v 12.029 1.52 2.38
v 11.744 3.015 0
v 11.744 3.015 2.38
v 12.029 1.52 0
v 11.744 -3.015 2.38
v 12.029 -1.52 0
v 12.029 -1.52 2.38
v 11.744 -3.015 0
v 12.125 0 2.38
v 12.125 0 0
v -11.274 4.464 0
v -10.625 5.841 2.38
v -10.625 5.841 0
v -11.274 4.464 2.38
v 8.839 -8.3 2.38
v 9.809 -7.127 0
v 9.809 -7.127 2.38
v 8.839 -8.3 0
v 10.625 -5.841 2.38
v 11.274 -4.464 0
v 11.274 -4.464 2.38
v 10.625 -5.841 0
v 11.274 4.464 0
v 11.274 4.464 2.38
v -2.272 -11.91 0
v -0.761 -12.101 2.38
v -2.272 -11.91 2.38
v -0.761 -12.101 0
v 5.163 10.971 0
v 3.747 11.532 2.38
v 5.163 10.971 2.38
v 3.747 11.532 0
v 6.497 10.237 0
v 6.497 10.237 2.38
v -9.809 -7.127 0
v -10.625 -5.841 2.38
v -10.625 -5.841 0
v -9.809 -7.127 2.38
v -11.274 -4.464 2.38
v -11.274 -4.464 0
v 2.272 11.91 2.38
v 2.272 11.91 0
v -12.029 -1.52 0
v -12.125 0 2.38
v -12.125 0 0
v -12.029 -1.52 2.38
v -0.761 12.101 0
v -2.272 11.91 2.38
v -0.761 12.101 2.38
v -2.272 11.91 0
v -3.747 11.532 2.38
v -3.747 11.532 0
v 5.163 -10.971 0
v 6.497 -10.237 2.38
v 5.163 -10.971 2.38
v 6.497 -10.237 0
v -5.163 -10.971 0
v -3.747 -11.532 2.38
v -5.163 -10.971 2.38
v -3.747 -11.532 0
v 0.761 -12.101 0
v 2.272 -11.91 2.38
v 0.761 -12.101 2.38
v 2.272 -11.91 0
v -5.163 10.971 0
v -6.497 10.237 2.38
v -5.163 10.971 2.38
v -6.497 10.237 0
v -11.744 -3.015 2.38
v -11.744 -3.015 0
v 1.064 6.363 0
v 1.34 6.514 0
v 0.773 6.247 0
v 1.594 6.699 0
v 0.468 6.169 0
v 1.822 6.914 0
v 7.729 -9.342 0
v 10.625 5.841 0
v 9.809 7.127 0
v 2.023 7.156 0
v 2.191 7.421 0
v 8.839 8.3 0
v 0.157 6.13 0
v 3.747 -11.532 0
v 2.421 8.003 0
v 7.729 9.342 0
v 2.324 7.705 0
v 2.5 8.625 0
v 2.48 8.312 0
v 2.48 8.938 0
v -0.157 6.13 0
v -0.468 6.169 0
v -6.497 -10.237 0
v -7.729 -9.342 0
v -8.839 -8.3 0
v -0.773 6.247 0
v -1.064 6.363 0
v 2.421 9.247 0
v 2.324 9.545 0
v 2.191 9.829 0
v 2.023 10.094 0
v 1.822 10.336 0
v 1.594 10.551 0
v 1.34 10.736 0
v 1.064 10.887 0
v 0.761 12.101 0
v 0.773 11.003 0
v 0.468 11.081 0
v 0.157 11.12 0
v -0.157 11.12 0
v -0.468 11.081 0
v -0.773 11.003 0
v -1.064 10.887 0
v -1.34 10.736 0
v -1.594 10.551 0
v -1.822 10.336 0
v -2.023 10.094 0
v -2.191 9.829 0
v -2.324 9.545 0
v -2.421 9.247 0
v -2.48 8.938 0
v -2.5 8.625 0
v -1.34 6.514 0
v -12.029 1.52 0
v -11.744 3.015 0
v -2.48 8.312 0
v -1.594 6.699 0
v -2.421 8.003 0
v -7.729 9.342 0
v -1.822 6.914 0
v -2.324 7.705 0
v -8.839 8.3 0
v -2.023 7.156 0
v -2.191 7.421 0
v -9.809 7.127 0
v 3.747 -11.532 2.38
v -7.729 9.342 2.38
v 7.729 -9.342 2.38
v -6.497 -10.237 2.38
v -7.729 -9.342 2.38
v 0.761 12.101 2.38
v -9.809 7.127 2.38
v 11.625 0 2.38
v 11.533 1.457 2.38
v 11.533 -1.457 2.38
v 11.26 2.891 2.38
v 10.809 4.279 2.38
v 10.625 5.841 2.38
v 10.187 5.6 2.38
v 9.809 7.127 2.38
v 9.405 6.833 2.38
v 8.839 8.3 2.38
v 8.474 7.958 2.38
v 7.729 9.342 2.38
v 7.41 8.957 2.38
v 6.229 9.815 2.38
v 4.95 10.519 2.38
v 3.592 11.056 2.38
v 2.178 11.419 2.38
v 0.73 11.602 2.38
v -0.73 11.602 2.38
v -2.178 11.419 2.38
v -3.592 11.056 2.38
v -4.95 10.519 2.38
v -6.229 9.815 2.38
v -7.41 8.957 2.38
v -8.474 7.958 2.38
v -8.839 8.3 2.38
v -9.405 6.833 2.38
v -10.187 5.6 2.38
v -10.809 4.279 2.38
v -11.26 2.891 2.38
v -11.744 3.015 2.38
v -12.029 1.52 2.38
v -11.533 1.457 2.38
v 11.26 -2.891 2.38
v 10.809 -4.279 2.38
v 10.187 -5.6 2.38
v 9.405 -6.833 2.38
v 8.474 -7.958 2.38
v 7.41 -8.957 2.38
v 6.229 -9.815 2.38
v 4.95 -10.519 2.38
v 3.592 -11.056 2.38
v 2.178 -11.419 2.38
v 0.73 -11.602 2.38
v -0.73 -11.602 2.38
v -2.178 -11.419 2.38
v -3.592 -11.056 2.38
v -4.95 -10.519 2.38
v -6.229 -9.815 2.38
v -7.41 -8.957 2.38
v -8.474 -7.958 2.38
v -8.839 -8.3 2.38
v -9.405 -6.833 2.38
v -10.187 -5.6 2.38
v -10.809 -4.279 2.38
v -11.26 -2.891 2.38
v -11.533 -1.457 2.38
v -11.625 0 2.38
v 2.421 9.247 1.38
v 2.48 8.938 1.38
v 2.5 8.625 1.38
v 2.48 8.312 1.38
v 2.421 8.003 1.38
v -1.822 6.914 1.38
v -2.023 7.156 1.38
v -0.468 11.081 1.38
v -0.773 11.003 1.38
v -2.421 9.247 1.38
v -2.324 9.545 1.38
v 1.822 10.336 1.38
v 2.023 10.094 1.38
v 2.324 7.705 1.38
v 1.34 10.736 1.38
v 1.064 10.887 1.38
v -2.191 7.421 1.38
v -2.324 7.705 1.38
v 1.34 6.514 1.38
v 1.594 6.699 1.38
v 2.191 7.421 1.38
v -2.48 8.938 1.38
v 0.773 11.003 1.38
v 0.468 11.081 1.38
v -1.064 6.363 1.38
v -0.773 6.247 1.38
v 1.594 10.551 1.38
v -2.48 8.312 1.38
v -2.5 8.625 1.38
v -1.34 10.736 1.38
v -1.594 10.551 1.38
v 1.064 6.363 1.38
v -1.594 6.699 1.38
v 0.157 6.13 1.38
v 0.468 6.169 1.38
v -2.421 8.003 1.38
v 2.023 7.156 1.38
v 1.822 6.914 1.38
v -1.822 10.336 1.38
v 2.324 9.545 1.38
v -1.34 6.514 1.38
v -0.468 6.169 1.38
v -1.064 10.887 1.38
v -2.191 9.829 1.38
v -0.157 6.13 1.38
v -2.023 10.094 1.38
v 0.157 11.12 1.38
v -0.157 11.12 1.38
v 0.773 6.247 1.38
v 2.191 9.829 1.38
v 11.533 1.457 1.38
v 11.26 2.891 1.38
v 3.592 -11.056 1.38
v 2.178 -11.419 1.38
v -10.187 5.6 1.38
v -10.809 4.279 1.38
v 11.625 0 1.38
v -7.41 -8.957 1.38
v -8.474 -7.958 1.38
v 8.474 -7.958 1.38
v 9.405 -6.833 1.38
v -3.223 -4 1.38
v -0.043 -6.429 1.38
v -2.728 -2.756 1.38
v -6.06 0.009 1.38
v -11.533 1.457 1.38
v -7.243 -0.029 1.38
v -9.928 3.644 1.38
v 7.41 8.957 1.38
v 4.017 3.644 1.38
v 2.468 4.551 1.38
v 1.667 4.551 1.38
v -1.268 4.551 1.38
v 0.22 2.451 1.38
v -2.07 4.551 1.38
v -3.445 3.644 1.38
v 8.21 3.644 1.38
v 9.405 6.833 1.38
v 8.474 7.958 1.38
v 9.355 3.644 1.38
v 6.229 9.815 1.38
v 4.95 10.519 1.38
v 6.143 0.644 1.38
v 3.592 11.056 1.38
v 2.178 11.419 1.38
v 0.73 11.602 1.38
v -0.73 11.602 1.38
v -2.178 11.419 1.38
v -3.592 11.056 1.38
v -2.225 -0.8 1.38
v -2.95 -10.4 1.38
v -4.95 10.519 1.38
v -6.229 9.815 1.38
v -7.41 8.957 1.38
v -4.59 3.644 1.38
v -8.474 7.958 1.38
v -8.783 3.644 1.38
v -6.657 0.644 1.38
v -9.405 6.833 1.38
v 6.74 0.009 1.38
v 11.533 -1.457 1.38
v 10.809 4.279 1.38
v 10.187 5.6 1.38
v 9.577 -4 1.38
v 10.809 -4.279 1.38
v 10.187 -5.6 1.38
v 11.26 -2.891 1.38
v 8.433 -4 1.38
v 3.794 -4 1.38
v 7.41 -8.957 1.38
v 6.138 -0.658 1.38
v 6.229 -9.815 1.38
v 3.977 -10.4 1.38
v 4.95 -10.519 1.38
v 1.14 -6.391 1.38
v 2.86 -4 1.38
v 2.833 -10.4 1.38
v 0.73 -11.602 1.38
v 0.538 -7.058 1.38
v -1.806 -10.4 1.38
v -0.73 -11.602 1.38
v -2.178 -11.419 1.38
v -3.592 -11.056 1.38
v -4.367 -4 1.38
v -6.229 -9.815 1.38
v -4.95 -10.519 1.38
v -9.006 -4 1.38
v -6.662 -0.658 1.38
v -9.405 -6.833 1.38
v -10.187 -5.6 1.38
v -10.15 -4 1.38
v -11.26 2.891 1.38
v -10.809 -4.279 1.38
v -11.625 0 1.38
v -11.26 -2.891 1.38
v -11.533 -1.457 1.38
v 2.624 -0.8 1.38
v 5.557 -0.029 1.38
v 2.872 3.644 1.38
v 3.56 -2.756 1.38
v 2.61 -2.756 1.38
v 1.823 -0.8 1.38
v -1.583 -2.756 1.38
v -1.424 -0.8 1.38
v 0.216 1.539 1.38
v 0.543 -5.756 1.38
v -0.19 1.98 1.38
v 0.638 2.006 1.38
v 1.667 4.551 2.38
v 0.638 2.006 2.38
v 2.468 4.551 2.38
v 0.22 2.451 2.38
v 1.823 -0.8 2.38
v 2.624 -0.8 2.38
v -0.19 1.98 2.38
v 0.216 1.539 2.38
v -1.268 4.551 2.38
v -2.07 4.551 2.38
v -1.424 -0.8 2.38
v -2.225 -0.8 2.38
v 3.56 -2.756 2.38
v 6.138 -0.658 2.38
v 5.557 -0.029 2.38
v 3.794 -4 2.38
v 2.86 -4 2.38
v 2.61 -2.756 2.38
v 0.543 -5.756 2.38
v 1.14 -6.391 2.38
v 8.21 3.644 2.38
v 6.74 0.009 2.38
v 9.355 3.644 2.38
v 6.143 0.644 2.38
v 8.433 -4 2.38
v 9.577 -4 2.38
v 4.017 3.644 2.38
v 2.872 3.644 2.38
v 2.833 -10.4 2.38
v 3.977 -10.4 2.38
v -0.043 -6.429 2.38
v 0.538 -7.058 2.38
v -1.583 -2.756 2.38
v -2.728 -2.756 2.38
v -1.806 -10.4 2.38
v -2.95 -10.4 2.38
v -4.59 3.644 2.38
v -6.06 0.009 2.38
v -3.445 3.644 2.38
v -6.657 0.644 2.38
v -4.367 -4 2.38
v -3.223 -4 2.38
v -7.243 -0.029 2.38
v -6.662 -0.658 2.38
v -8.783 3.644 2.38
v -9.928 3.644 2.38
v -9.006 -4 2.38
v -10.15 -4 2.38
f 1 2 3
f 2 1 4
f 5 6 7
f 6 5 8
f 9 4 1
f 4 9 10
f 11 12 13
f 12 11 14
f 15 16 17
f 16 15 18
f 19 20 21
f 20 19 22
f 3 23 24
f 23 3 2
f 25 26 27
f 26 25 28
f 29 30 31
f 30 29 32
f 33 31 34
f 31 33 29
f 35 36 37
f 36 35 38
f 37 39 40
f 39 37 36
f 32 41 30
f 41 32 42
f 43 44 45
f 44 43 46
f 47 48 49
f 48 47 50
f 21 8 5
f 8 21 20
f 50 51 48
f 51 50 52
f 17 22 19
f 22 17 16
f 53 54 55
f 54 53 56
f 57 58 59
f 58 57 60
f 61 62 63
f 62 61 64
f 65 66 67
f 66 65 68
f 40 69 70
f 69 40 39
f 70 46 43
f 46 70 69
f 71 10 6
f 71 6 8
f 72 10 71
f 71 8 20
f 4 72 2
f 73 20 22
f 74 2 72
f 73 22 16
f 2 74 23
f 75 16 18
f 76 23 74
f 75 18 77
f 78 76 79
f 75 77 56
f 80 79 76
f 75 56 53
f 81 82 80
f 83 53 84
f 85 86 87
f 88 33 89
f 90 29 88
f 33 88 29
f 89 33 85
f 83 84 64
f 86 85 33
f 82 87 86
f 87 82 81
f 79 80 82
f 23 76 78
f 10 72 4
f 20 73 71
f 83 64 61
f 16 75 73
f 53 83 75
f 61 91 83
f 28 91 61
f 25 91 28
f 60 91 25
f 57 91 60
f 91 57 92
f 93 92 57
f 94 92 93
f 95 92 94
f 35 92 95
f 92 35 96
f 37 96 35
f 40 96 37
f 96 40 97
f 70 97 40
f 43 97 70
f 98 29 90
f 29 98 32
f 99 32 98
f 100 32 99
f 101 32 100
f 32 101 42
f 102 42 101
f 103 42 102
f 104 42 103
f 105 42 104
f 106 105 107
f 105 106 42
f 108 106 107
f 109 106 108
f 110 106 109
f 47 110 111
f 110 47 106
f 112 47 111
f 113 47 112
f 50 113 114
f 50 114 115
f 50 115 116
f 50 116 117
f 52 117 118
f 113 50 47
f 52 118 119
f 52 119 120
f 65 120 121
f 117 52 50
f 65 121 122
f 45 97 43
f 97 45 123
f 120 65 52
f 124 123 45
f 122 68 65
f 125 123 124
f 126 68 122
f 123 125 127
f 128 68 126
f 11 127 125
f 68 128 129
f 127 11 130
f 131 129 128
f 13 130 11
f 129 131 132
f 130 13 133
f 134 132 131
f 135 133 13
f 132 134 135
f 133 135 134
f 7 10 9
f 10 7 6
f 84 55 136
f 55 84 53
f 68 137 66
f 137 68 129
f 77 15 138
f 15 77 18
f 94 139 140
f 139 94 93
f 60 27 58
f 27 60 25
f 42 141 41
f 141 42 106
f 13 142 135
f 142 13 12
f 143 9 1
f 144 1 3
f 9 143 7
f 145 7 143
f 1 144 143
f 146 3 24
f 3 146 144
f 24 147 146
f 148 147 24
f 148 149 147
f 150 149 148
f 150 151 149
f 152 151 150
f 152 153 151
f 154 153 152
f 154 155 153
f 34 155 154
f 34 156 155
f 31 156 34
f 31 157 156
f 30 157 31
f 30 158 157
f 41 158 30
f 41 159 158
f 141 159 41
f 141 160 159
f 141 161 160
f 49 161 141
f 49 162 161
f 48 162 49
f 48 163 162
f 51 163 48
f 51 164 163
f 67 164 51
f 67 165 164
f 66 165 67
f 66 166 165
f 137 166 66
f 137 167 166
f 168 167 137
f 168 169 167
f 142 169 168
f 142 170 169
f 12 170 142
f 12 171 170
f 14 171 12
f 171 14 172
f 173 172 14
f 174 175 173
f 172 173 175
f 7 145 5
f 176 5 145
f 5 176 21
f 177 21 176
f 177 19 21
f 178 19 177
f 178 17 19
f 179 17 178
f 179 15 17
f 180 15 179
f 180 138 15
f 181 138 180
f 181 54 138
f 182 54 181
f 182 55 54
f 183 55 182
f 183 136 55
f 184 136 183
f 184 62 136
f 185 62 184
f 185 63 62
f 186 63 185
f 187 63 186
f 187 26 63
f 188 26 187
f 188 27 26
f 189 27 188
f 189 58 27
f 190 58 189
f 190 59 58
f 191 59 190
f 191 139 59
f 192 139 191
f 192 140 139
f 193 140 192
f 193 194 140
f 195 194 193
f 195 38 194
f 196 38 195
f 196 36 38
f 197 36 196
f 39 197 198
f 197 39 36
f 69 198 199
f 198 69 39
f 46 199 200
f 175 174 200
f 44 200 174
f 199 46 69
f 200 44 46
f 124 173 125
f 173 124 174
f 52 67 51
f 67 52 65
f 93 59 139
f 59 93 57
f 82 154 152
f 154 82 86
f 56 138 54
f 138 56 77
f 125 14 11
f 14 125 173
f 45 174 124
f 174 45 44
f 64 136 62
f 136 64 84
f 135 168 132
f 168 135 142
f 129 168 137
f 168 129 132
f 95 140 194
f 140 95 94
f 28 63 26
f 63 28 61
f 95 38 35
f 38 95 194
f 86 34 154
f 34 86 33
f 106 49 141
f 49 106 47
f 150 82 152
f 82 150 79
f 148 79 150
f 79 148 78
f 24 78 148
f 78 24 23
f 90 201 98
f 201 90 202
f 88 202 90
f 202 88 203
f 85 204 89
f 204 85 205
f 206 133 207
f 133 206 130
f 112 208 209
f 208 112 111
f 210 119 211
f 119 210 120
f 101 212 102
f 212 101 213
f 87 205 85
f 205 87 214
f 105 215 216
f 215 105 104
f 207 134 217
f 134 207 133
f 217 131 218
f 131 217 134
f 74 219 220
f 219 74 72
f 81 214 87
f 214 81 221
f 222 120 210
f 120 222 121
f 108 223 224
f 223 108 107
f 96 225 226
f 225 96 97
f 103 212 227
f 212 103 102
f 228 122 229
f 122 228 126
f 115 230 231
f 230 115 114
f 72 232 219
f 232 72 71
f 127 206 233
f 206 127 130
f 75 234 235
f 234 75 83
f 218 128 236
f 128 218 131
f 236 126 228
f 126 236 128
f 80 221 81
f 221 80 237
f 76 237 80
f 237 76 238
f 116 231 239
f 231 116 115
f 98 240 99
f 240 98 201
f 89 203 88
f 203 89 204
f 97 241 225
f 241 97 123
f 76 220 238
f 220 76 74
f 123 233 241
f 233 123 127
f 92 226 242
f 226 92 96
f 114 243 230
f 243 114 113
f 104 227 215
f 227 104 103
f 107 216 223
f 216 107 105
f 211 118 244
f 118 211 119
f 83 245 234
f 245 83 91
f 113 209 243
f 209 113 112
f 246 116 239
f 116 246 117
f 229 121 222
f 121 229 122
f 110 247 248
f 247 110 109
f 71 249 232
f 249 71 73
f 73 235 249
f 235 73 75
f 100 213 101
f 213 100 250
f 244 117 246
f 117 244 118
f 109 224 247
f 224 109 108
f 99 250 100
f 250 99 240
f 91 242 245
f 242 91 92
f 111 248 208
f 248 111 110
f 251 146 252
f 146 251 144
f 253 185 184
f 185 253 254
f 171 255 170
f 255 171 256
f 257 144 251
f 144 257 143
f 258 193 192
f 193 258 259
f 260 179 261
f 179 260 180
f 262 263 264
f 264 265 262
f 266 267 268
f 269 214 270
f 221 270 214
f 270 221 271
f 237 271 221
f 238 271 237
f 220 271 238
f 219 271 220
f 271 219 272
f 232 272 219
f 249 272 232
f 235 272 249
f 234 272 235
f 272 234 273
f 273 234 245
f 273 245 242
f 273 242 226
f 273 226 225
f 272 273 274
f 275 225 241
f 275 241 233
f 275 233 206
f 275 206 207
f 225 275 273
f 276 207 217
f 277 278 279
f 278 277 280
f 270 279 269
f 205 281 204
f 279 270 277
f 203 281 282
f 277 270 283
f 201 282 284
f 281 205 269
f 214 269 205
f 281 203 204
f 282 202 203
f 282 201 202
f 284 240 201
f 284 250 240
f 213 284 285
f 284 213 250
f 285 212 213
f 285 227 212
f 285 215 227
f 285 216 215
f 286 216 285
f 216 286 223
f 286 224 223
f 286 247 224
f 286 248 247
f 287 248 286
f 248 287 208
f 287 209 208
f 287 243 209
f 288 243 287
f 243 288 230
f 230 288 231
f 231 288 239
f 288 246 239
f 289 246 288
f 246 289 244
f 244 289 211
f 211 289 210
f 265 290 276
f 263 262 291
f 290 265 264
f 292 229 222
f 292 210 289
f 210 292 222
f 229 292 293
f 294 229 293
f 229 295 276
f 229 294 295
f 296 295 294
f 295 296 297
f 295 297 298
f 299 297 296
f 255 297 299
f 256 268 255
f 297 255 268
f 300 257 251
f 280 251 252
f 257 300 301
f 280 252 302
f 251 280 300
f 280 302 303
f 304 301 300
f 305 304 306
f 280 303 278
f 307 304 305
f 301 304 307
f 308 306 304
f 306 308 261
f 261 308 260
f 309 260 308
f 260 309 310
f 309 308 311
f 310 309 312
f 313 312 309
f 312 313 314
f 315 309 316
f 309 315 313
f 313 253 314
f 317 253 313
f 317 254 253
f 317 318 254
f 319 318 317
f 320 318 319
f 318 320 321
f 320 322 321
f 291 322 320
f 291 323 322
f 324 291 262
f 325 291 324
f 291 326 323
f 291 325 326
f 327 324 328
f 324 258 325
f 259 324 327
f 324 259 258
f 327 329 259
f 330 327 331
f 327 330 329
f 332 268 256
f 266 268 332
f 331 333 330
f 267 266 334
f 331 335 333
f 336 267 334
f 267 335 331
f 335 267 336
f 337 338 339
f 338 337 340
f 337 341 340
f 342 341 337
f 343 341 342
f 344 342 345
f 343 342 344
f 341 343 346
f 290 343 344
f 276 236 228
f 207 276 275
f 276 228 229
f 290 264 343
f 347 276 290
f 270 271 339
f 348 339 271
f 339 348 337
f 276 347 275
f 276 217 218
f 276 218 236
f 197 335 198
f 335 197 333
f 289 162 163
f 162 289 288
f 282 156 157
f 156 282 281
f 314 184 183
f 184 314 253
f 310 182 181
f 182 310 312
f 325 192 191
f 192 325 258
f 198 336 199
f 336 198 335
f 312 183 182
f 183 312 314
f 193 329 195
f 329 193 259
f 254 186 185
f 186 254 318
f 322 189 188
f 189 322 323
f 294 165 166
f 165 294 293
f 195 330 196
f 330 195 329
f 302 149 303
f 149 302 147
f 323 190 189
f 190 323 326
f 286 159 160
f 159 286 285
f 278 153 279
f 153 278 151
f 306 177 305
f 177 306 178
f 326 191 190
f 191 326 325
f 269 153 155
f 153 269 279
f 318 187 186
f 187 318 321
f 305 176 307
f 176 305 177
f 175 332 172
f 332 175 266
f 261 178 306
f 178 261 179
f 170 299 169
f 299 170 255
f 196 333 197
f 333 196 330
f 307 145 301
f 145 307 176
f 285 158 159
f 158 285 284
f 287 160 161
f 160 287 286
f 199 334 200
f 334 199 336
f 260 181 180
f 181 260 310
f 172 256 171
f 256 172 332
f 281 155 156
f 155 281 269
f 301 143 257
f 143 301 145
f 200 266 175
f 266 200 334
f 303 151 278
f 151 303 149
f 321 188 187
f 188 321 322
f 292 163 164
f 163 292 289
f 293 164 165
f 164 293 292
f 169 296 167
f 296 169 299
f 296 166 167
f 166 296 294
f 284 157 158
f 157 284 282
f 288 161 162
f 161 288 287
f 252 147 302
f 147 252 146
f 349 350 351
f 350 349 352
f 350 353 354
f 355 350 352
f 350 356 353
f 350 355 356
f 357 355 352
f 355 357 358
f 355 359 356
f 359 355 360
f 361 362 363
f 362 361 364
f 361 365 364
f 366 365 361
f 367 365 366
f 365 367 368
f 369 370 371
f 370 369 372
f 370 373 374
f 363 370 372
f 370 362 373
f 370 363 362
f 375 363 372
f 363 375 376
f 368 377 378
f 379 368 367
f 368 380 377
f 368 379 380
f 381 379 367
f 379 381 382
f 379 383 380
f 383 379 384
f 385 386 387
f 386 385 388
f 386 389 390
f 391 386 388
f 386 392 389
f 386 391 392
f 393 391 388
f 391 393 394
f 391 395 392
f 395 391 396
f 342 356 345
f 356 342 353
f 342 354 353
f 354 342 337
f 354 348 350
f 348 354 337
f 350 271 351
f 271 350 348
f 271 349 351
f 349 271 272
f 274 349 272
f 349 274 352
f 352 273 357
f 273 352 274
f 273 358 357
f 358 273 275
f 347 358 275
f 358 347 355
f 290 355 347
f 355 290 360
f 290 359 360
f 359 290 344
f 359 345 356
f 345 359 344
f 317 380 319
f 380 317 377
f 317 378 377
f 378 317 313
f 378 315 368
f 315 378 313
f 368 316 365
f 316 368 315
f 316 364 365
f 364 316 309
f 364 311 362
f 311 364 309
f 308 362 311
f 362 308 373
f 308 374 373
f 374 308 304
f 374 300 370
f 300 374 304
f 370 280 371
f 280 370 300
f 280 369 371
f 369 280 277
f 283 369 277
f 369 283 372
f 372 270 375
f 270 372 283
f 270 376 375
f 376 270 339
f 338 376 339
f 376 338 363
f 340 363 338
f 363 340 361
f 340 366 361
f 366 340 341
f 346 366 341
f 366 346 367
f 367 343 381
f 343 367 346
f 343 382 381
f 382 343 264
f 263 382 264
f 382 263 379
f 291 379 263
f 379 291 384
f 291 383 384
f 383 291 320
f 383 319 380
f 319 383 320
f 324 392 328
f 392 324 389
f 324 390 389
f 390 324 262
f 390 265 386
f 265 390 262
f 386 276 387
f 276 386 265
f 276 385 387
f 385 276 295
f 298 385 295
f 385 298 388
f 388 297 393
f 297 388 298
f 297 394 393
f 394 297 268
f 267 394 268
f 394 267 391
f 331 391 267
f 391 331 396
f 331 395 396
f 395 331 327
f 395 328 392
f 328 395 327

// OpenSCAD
// https://economy-finance.ec.europa.eu/euro/euro-coins-and-notes/euro-coins/common-sides-euro-coins_en

// Letter left
LL = "X";
// ...right
LR = "X";
// ... middle (low)
LM = "X";
// ... top (small)
LT = "X";

COIN_D = 24.25;
COIN_H = 2.38;
// key ring hole
HOLE_D = 5;
// key ring hole wall
TOP_S = 1;

// circle resolution
FN = 50;

module unused_test() {
    translate([0,4,0])
        linear_extrude(5)
            text(LR);
    translate([2,-5,0])
        linear_extrude(5)
            text(LL);
    translate([5,0,0])
        linear_extrude(7)
            text(LM);
    translate([-5,0,0])
        linear_extrude(7)
            text(LT);
}

module coin() {
   difference() {
    linear_extrude(COIN_H)
        circle(d=COIN_D, $fn=FN);
    translate([0,COIN_D/2-HOLE_D/2-TOP_S,-1])
        linear_extrude(5)
            circle(d=HOLE_D, $fn=FN);
    translate([0,0,COIN_H-TOP_S])
        linear_extrude(COIN_H)
            circle(d=COIN_D-TOP_S, $fn=FN);
    }
}

union() {
    coin();
    linear_extrude(COIN_H) scale([0.8,0.8,0.8]){
        translate([3,-5,0])
            text(LR);
        translate([-13,-5,0])
            text(LL);
        translate([-4,-13,0])
            text(LM);
        translate([-3,-1,0]) scale([0.7,0.7,0.7])
            text(LT);
    }
}
